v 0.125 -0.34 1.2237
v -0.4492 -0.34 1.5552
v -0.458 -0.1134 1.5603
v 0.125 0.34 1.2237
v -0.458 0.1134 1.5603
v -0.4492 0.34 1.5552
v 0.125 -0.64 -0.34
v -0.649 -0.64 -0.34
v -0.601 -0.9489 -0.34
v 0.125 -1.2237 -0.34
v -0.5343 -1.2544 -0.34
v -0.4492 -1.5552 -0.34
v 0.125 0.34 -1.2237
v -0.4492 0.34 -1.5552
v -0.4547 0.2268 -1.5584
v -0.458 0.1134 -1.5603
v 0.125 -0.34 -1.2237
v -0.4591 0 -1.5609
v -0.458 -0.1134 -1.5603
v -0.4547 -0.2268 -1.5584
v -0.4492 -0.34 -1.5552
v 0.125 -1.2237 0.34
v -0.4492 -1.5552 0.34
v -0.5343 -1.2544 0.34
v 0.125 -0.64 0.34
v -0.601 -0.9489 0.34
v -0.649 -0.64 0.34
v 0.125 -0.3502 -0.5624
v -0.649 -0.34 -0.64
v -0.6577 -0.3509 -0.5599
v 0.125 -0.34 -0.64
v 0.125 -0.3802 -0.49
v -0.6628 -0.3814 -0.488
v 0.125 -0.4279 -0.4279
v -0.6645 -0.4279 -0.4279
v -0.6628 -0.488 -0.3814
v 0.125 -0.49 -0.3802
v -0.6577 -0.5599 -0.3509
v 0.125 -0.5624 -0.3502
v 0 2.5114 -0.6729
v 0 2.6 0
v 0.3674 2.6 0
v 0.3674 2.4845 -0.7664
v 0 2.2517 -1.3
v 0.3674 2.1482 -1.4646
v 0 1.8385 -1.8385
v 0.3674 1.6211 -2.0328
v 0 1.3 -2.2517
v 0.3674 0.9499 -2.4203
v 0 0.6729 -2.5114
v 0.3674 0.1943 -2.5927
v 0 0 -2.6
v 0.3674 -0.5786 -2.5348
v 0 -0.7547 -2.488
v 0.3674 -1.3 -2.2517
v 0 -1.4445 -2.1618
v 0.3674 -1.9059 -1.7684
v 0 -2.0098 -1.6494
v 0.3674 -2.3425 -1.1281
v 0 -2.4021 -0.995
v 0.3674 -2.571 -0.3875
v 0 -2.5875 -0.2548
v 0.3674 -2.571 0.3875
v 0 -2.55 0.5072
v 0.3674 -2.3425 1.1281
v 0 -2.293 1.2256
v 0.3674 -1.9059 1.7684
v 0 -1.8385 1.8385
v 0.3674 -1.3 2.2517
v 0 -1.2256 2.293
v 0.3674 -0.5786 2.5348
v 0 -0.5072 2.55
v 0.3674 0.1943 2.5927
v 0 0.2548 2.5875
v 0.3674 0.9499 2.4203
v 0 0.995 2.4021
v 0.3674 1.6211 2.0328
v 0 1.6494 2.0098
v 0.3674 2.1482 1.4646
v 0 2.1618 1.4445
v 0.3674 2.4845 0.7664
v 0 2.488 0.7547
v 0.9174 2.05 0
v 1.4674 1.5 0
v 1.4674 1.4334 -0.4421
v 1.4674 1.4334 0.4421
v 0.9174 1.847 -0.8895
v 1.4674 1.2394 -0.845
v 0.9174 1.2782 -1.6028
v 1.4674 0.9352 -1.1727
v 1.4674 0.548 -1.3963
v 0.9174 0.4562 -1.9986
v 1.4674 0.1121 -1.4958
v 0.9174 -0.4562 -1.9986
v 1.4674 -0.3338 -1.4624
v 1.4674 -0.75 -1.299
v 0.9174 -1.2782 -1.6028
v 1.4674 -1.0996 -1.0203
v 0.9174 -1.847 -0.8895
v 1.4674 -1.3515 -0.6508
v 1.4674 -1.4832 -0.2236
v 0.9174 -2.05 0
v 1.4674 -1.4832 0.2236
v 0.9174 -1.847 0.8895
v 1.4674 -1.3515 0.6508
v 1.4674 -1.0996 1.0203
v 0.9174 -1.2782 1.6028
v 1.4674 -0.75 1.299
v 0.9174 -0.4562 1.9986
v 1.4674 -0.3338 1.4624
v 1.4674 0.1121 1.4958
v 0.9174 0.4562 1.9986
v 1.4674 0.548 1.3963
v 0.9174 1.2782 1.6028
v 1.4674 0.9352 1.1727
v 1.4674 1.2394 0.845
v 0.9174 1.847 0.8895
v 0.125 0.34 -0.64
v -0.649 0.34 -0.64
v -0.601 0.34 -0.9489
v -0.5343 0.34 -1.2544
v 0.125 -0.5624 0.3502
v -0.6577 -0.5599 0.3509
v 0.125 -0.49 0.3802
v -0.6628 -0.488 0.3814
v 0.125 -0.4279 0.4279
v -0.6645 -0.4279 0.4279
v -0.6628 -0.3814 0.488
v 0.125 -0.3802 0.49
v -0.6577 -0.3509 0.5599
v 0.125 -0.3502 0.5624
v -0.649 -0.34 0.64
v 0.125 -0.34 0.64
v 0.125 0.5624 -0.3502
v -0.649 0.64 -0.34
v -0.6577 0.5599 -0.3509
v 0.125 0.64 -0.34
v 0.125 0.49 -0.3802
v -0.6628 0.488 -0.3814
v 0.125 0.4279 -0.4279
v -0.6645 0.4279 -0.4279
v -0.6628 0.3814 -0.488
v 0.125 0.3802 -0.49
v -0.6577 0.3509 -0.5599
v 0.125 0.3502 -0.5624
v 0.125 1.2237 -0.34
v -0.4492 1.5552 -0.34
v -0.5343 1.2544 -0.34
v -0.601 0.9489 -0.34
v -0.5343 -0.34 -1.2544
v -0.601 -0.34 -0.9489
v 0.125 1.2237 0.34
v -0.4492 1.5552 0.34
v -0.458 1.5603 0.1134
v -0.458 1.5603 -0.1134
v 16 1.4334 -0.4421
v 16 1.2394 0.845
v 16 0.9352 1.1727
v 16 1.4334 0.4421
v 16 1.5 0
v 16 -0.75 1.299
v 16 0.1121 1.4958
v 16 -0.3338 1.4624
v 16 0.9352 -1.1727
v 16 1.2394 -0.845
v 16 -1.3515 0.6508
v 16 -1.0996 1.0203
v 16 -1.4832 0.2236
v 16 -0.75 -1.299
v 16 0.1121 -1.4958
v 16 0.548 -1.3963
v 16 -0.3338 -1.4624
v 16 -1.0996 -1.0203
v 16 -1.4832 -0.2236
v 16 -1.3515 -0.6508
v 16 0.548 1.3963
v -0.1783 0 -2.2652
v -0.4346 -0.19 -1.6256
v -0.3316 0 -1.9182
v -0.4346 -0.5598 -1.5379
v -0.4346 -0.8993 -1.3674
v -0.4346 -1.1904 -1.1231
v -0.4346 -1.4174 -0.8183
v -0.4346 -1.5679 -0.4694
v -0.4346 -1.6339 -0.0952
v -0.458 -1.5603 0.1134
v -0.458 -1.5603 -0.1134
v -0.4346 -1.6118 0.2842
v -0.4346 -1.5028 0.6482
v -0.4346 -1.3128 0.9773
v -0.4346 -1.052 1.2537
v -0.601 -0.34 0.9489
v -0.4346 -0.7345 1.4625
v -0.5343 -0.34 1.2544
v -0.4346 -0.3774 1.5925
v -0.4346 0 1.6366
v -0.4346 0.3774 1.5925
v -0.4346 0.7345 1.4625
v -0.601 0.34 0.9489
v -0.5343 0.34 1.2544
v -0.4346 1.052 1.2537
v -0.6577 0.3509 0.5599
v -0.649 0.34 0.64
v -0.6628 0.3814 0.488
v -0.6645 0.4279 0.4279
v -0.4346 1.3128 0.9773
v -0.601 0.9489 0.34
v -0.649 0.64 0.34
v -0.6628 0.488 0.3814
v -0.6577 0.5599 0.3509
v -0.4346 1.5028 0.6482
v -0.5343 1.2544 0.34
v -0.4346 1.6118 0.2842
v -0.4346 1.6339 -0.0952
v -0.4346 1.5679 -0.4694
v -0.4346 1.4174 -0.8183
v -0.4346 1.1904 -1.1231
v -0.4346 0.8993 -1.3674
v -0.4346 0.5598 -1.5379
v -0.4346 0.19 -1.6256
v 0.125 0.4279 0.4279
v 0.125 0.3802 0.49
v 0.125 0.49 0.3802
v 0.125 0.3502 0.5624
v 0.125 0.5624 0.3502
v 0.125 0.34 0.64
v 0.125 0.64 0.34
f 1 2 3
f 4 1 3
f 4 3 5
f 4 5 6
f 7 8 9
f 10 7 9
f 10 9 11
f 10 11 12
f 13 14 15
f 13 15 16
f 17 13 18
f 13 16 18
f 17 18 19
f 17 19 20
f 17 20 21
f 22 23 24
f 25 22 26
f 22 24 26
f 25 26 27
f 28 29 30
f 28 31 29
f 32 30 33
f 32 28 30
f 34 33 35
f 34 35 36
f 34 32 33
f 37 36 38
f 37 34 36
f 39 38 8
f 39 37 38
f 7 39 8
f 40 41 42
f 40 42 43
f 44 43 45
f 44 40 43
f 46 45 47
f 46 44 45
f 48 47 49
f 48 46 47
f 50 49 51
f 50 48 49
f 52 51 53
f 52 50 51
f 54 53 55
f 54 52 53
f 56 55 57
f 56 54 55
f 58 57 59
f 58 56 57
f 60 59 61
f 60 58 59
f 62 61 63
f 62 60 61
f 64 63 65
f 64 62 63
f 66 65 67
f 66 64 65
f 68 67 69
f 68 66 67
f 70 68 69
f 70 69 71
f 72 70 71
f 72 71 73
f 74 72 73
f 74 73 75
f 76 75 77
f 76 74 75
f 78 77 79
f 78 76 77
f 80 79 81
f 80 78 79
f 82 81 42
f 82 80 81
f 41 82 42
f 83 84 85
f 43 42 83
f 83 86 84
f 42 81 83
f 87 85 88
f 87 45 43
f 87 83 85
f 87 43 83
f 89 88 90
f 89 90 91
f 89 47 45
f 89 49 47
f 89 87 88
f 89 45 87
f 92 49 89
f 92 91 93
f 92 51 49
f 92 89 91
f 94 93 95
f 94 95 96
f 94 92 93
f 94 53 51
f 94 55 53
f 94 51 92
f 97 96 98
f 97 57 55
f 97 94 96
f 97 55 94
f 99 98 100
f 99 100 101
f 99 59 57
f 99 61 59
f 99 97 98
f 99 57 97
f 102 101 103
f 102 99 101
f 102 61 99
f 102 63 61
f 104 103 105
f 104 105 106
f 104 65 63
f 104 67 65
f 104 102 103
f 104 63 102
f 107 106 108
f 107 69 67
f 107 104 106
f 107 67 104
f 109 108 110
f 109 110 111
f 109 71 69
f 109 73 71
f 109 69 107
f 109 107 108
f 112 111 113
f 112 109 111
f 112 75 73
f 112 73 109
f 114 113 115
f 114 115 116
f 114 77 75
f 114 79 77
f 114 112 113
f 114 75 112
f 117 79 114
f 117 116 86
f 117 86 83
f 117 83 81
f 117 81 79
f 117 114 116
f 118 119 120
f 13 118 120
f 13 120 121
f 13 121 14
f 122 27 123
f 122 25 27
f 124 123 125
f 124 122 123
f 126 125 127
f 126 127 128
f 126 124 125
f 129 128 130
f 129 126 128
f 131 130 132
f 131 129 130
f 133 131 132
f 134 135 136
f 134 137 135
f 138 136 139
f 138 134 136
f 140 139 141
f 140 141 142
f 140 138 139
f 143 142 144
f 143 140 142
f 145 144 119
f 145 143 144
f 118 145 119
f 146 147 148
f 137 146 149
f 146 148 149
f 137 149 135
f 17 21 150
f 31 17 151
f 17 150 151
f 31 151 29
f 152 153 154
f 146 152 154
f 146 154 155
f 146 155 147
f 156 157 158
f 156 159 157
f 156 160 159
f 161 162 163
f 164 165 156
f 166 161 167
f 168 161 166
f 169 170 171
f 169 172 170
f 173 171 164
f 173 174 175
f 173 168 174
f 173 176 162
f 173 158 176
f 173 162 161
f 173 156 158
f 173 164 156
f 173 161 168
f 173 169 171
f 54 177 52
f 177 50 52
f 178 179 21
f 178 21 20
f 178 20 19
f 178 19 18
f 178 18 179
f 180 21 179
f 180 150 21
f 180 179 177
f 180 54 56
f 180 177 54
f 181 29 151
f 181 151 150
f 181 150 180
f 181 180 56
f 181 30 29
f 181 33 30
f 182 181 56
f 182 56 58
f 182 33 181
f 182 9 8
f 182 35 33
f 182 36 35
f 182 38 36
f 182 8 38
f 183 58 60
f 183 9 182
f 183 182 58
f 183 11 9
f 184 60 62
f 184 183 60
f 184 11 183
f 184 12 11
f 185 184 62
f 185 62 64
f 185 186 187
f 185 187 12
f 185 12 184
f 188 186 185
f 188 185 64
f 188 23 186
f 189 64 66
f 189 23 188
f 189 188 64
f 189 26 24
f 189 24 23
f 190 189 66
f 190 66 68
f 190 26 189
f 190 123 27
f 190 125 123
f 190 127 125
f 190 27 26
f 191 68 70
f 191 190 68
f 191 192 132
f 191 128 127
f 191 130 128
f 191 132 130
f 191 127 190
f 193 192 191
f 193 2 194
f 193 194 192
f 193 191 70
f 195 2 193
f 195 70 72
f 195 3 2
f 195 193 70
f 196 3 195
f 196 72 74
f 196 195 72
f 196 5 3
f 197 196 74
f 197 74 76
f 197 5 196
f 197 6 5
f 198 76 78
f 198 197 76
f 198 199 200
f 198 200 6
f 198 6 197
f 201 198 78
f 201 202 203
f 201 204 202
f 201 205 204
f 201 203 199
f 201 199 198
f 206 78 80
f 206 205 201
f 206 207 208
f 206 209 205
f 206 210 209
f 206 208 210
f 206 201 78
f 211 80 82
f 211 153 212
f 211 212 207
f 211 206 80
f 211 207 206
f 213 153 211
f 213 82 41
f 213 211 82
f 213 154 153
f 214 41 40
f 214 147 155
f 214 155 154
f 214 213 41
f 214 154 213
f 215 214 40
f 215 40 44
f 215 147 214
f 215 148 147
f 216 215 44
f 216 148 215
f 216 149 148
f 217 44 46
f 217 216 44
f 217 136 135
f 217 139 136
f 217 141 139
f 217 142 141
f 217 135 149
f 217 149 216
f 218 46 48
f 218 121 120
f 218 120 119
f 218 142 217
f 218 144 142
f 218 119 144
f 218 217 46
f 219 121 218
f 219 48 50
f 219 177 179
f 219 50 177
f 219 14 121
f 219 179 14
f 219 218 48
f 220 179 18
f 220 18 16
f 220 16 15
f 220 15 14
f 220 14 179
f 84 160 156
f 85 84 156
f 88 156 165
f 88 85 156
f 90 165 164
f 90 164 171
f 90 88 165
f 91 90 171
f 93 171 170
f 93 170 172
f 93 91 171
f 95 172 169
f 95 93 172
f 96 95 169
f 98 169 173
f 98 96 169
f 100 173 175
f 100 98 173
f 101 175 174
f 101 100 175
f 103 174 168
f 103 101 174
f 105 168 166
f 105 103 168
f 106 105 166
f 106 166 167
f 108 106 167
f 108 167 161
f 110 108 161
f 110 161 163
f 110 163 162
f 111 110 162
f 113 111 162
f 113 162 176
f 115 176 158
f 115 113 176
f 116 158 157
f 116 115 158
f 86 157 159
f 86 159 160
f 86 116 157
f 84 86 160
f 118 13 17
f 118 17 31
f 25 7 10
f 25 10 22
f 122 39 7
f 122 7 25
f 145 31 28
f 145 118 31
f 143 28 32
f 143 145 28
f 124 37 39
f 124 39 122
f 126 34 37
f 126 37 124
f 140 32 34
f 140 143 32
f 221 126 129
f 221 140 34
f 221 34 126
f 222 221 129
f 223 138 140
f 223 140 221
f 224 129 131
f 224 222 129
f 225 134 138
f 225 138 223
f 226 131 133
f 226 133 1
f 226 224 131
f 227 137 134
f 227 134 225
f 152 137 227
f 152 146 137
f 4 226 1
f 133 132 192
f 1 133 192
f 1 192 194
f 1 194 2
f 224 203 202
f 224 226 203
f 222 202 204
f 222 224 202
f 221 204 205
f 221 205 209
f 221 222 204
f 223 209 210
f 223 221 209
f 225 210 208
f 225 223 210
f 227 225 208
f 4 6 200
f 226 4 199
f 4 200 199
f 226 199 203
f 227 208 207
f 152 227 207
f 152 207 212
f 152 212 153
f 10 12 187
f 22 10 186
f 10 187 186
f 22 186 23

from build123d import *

# Parameters (mm, degrees)
BASETOP_FACE_RADIUS = 2.6
BASETOP_HEIGHT      = 0.7
CROSSRECESS_DEPTH   = 0.825
DRAFT9_ANGLE        = -30
FILLET5_R           = 0.3


with BuildPart() as part:
    # Sketch1 → Base (revolve)
    with BuildSketch(Plane.XY):
        Polygon((16, 1.5), (2.737867966, 1.5), (1.467367966, 1.5), (0.367367966, 2.6), (0, 2.6), (0, 0), (16, 0), align=None)
    revolve(axis=Axis((4.515812911, 0, 0), (-1, 0, 0)))

    # BaseTop: a dome of height H over a round flat face of radius A is a cap of a sphere of radius (A * A + H * H) / (2 * H)
    basetop_r = (BASETOP_FACE_RADIUS * BASETOP_FACE_RADIUS + BASETOP_HEIGHT * BASETOP_HEIGHT) / (2 * BASETOP_HEIGHT)
    basetop_base = Plane((0, 0, 0), z_dir=(-1, 0, 0))
    with Locations(basetop_base.offset(BASETOP_HEIGHT - basetop_r)):
        basetop_ball = Sphere(basetop_r, mode=Mode.PRIVATE)
    add(split(basetop_ball, bisect_by=basetop_base, keep=Keep.TOP, mode=Mode.PRIVATE))

    # Sketch6 → CrossRecess (cut)
    with BuildSketch(Plane.ZY.offset(0.7)):
        Polygon((0.34, 0.34), (0.34, 1.7), (-0.34, 1.7), (-0.34, 0.34), (-1.7, 0.34), (-1.7, -0.34), (-0.34, -0.34), (-0.34, -1.7), (0.34, -1.7), (0.34, -0.34), (1.7, -0.34), (1.7, 0.34), align=None)
    extrude(amount=-CROSSRECESS_DEPTH, mode=Mode.SUBTRACT)

    # Draft9
    draft9_faces = [part.faces().sort_by_distance(p)[0] for p in [
        (-0.14204754, 0, -1.7),
        (-0.14204754, -1.7, 0),
        (-0.14204754, 0, 1.7),
        (-0.14204754, 1.7, 0),
    ]]
    draft(draft9_faces, Plane(origin=(-0.7, 0, 0), x_dir=(0, 0, 1), z_dir=(1, 0, 0)), DRAFT9_ANGLE)

    # Fillet5
    fillet5_edges = [part.edges().sort_by_distance(p)[0] for p in [
        (-0.27631446, 0.34, -0.34),
        (-0.27631446, 0.34, 0.34),
        (-0.27631446, -0.34, 0.34),
        (-0.27631446, -0.34, -0.34),
    ]]
    fillet(fillet5_edges, radius=FILLET5_R)


solid = part.part
